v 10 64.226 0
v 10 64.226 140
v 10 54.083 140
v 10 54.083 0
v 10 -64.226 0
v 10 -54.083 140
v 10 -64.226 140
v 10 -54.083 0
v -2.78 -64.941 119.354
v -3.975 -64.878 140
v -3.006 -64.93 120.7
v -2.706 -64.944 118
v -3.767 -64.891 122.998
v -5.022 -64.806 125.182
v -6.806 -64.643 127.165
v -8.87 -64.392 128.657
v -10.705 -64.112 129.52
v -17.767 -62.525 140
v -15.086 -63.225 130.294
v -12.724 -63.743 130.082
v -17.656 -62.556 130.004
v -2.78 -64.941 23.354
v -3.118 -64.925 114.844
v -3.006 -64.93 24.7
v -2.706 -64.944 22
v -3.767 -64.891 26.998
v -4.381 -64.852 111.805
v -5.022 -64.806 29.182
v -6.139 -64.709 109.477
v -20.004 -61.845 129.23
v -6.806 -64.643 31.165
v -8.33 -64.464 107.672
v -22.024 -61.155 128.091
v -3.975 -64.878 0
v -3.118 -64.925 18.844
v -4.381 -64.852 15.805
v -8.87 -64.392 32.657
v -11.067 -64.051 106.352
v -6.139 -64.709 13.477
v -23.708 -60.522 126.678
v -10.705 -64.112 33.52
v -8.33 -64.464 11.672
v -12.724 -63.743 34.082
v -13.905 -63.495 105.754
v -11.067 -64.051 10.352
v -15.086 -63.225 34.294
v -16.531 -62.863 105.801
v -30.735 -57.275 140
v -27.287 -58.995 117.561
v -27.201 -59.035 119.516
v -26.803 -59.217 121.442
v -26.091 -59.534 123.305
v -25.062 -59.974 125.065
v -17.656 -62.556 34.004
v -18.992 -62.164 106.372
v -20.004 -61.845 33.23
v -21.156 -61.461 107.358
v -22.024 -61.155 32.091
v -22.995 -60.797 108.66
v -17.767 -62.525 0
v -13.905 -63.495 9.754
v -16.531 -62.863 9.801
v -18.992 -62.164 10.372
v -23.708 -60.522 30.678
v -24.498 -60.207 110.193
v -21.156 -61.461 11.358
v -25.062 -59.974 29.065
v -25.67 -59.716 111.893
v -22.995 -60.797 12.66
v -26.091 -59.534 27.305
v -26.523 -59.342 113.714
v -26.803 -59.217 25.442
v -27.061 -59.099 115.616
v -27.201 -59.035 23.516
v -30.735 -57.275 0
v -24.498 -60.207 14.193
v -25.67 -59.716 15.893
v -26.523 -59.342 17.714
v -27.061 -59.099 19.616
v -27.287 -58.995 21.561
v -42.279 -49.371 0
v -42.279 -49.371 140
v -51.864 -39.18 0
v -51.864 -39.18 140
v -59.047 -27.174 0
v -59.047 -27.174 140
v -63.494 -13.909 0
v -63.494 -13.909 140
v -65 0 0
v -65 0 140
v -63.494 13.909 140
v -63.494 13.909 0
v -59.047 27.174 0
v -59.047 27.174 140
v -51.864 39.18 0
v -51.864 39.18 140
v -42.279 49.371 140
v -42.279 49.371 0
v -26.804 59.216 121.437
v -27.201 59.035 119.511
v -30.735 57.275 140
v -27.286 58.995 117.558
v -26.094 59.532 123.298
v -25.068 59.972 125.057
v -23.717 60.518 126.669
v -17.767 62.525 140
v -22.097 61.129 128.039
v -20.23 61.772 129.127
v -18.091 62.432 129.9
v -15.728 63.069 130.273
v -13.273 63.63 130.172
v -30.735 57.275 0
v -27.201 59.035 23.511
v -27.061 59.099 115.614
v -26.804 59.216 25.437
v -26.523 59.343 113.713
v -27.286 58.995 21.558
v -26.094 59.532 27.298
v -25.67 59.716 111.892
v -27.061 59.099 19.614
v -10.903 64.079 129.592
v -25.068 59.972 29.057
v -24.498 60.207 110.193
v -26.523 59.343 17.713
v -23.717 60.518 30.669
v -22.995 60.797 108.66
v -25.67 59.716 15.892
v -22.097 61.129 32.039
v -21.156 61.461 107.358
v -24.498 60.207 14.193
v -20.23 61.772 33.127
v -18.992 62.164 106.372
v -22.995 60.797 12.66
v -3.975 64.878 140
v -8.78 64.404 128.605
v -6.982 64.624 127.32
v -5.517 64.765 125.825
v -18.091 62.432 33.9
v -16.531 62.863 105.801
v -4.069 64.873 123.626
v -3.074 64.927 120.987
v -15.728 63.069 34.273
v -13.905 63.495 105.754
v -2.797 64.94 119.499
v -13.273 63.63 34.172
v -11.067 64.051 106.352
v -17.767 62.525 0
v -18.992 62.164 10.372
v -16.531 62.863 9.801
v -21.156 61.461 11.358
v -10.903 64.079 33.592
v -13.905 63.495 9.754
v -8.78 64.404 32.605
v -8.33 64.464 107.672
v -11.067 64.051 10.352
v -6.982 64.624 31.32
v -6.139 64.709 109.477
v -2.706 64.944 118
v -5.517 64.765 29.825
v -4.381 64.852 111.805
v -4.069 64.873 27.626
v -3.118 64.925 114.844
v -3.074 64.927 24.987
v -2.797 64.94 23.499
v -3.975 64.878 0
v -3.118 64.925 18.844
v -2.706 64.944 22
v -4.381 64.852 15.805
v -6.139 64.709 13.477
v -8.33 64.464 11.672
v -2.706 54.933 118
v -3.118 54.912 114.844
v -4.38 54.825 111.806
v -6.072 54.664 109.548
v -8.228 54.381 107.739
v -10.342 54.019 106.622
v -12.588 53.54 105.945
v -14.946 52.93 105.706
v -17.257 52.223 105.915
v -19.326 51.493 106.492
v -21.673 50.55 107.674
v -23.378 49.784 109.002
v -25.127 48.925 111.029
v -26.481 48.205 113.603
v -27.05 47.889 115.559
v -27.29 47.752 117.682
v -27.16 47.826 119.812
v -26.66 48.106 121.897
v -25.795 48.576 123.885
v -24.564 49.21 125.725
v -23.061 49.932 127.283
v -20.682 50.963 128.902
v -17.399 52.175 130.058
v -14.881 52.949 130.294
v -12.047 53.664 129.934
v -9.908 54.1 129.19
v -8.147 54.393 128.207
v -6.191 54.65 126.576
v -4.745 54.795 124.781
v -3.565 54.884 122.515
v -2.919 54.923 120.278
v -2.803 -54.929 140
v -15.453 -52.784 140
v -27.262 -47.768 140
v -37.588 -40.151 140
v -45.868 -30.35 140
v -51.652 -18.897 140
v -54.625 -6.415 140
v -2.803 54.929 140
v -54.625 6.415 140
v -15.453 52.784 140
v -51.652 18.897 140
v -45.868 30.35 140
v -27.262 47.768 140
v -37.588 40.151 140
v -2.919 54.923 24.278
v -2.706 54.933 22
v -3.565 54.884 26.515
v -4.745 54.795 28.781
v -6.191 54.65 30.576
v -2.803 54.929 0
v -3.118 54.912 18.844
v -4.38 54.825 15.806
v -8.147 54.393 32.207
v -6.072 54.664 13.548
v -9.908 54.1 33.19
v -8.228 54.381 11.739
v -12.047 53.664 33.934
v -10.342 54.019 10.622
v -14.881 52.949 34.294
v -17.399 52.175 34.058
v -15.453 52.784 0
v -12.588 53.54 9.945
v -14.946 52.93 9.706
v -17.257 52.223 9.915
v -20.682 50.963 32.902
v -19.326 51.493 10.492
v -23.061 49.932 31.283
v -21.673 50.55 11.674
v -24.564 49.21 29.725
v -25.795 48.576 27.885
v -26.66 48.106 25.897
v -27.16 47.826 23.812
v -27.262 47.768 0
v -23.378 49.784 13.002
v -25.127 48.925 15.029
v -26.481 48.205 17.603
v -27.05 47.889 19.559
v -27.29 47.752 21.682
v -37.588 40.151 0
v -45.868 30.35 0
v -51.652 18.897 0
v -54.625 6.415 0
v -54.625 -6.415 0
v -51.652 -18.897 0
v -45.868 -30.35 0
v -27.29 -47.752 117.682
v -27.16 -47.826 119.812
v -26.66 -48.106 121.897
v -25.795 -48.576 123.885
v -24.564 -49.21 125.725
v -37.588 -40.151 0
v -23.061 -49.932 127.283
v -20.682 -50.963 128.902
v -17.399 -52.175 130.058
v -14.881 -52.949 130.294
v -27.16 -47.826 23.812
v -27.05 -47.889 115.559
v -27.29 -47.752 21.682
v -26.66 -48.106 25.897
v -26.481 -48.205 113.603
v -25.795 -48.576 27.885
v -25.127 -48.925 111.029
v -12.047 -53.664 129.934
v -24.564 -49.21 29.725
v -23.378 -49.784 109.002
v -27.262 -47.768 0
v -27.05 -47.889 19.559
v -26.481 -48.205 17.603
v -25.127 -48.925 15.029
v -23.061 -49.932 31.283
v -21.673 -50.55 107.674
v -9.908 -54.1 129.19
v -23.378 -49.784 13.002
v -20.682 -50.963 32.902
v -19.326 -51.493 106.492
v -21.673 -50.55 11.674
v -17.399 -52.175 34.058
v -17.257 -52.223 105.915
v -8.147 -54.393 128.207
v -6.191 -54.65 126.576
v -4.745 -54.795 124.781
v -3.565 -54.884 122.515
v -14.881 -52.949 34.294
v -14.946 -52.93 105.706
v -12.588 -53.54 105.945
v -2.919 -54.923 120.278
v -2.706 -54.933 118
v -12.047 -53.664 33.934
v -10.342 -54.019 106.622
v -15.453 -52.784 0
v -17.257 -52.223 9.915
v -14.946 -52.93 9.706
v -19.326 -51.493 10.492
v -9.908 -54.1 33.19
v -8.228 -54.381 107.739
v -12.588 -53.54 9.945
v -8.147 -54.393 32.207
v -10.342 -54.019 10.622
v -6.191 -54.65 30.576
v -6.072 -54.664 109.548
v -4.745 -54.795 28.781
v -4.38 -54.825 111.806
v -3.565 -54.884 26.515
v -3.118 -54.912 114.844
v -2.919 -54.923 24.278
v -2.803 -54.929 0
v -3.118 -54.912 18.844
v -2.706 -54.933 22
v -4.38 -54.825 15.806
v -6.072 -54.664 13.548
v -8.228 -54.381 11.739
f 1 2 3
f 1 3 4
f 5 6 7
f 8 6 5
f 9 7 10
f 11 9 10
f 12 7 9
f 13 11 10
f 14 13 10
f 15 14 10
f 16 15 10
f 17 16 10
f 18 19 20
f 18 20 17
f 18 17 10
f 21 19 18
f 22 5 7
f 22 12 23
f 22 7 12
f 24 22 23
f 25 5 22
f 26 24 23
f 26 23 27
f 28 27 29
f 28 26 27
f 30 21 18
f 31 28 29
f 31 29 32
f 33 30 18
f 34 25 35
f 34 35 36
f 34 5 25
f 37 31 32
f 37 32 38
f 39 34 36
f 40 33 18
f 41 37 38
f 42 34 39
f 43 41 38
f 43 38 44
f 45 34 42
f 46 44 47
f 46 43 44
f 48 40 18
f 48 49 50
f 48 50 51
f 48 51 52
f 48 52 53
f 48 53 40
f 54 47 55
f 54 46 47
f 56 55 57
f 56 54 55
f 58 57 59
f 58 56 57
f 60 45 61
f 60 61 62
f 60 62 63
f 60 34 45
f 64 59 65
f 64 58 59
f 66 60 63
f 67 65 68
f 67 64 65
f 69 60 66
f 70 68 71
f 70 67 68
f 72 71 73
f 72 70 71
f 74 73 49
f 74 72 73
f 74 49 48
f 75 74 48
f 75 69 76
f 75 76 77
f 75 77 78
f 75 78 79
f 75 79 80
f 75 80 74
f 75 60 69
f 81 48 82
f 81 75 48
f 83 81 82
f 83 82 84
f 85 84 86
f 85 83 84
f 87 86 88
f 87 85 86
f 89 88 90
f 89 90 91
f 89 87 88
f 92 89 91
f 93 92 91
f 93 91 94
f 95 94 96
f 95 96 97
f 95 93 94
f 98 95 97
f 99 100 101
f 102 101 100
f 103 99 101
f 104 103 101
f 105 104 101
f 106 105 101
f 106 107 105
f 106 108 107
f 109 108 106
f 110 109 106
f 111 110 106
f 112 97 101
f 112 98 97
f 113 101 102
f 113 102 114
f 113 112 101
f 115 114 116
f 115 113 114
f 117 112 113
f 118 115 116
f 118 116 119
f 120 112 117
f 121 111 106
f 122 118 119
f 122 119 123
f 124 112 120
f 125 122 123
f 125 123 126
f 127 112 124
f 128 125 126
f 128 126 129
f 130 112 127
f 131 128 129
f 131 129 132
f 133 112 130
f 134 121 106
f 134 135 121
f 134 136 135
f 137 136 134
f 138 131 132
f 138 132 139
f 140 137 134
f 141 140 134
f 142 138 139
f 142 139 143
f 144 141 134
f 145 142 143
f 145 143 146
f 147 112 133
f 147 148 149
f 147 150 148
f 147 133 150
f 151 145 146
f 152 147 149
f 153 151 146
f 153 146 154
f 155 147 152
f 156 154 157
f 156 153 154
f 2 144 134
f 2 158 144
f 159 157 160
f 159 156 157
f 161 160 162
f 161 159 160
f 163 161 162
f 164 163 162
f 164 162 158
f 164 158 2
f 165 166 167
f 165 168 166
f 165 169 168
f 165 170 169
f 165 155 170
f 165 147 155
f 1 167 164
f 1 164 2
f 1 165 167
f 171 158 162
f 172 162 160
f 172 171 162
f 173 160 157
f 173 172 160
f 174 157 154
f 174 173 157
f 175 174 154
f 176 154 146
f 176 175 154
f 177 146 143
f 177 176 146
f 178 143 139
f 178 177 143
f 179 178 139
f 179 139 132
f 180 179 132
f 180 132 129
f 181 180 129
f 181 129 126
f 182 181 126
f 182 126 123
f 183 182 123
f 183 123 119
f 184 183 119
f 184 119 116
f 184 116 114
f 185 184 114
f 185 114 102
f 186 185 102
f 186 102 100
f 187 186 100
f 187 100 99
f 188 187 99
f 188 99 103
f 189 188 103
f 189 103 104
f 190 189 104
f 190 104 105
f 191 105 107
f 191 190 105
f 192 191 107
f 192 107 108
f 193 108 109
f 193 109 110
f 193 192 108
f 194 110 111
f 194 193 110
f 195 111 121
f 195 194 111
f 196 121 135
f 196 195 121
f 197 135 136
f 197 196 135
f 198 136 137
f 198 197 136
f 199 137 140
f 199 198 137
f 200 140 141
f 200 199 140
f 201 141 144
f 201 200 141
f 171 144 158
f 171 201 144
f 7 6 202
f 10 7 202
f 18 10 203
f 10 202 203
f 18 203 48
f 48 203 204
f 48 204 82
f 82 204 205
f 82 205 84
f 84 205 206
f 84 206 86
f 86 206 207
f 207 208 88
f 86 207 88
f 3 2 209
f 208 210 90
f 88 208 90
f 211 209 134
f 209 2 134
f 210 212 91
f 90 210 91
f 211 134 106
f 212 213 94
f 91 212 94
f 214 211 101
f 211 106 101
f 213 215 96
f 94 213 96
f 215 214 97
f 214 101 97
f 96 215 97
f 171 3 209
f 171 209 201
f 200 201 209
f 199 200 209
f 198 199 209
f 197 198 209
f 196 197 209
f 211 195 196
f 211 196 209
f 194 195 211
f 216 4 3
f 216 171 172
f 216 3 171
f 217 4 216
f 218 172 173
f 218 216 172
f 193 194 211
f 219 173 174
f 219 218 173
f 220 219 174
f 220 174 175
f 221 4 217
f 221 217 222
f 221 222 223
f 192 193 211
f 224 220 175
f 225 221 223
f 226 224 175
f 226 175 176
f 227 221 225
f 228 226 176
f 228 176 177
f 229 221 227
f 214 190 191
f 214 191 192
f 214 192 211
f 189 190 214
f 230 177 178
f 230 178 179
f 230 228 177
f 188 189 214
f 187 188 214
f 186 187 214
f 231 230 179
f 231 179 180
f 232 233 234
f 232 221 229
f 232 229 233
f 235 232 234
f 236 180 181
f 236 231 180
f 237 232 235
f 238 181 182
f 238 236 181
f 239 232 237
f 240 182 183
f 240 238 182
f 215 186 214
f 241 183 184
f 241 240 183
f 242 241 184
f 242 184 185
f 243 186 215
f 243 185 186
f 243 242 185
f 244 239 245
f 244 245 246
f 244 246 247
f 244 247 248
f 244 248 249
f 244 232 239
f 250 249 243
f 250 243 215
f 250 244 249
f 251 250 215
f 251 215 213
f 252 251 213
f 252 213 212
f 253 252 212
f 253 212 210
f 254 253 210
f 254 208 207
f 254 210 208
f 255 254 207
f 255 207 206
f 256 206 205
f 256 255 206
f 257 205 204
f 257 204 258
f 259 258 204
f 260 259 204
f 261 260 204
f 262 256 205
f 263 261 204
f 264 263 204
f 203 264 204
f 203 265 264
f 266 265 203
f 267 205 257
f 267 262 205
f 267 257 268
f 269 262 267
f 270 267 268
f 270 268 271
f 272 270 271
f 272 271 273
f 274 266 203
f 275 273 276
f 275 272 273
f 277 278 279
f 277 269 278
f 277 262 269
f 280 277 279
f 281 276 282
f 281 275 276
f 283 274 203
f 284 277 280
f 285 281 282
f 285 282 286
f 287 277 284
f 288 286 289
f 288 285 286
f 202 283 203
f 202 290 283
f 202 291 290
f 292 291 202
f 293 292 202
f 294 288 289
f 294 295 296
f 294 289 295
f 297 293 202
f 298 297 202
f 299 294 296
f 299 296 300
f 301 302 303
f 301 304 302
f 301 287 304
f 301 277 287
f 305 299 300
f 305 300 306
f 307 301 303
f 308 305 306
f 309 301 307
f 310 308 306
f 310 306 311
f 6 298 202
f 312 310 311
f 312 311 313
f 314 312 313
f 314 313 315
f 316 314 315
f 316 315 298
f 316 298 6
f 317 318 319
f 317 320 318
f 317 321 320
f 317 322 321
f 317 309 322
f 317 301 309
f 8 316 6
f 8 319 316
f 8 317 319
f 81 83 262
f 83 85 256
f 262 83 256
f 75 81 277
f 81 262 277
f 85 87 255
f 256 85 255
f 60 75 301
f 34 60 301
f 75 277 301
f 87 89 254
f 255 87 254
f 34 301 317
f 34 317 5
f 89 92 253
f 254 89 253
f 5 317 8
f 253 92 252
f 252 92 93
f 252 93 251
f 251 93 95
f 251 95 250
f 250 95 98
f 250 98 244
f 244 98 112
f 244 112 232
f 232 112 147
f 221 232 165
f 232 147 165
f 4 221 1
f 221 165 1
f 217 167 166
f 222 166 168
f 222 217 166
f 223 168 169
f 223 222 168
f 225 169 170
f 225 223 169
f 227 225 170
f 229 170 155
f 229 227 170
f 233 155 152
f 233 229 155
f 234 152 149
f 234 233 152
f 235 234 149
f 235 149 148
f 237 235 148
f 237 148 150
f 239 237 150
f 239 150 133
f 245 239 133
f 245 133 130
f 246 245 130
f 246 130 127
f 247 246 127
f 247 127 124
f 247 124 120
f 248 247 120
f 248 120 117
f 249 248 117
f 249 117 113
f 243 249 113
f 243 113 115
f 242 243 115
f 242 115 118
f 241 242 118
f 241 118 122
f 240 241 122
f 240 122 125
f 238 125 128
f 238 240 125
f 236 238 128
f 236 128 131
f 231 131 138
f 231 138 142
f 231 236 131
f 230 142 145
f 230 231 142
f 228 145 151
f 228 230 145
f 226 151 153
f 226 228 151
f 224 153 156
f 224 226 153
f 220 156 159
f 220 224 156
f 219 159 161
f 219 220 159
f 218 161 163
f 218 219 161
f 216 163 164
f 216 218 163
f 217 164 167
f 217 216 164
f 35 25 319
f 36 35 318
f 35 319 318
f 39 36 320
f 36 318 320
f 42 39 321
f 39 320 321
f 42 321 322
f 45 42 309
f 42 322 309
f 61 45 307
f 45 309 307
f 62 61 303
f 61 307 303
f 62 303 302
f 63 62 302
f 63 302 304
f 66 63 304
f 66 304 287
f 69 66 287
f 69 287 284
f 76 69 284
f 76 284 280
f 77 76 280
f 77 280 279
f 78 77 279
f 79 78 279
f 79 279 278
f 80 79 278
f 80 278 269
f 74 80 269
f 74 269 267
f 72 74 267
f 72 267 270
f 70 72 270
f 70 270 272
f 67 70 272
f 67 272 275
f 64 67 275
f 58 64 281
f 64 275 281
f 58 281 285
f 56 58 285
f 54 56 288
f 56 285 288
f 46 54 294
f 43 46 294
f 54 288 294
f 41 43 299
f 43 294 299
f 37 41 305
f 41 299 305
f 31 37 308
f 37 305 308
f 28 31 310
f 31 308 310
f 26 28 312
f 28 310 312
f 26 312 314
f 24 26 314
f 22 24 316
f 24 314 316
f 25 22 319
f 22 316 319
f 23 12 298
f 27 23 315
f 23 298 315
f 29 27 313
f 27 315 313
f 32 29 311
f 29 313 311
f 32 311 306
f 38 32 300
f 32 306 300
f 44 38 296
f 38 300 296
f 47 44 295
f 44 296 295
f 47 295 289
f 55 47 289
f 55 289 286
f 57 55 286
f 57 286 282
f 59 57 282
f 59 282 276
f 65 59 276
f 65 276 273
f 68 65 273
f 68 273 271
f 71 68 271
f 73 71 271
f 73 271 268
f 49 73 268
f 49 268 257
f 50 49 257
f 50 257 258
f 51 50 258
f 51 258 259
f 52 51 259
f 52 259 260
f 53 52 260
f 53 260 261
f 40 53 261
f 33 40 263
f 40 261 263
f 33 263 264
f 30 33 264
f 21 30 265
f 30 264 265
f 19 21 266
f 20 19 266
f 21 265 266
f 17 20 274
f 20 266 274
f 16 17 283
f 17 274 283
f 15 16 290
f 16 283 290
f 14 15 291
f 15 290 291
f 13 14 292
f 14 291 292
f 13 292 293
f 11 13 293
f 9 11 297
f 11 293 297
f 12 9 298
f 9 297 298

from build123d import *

# Parameters (mm, degrees)
ESQUISSE2_R                  = 65
ESQUISSE1_R                  = 65
ESQUISSE4_W                  = 168.541891076
ESQUISSE4_H                  = 143.597897644
ENL_V_MAT_EXTRU_2_DEPTH      = 56.0000001
COQUE2_T                     = -10
ESQUISSE5_R                  = 55
ENL_V_MAT_EXTRU_3_DEPTH      = 141
ESQUISSE6_R                  = 12.294398433
ENL_V_MAT_EXTRU_4_DEPTH      = 66
ENL_V_MAT_EXTRU_4_DEPTH_BACK = 66


with BuildPart() as part:
    # Esquisse2 → Lissage2 section 0
    with BuildSketch(Plane(origin=(0, 0, 140), x_dir=(-1, 0, 0), z_dir=(0, 0, -1))):
        Circle(ESQUISSE2_R)
    # Esquisse1 → Lissage2 section 1
    with BuildSketch(Plane.XY):
        Circle(ESQUISSE1_R)
    loft()

    # Esquisse4 → Enlèv. mat.-Extru.2 (cut, through all)
    with BuildSketch(Plane(origin=(10, 0, 0), x_dir=(0, 0, -1), z_dir=(1, 0, 0))):
        with Locations((-79.475842773, 1.247725941)):
            Rectangle(ESQUISSE4_W, ESQUISSE4_H)
    extrude(amount=ENL_V_MAT_EXTRU_2_DEPTH, mode=Mode.SUBTRACT)

    # Coque2
    coque2_openings = [part.faces().sort_by_distance(p)[0] for p in [
        (10, 7.25e-07, 70),
    ]]
    offset(amount=COQUE2_T, openings=coque2_openings)

    # Esquisse5 → Enlèv. mat.-Extru.3 (cut, through all)
    with BuildSketch(Plane.XY):
        Circle(ESQUISSE5_R)
    extrude(amount=ENL_V_MAT_EXTRU_3_DEPTH, mode=Mode.SUBTRACT)

    # Esquisse6 → Enlèv. mat.-Extru.4 (cut, two sides)
    with BuildSketch(Plane(origin=(0, 0, 0), x_dir=(1, 0, 0), z_dir=(0, 1, 0))) as enl_v_mat_extru_4_sk:
        with Locations((-15, -22)):
            Circle(ESQUISSE6_R)
        with Locations((-15, -118)):
            Circle(ESQUISSE6_R)
    extrude(amount=ENL_V_MAT_EXTRU_4_DEPTH, mode=Mode.SUBTRACT)
    extrude(enl_v_mat_extru_4_sk.sketch, amount=-ENL_V_MAT_EXTRU_4_DEPTH_BACK, mode=Mode.SUBTRACT)


solid = part.part
